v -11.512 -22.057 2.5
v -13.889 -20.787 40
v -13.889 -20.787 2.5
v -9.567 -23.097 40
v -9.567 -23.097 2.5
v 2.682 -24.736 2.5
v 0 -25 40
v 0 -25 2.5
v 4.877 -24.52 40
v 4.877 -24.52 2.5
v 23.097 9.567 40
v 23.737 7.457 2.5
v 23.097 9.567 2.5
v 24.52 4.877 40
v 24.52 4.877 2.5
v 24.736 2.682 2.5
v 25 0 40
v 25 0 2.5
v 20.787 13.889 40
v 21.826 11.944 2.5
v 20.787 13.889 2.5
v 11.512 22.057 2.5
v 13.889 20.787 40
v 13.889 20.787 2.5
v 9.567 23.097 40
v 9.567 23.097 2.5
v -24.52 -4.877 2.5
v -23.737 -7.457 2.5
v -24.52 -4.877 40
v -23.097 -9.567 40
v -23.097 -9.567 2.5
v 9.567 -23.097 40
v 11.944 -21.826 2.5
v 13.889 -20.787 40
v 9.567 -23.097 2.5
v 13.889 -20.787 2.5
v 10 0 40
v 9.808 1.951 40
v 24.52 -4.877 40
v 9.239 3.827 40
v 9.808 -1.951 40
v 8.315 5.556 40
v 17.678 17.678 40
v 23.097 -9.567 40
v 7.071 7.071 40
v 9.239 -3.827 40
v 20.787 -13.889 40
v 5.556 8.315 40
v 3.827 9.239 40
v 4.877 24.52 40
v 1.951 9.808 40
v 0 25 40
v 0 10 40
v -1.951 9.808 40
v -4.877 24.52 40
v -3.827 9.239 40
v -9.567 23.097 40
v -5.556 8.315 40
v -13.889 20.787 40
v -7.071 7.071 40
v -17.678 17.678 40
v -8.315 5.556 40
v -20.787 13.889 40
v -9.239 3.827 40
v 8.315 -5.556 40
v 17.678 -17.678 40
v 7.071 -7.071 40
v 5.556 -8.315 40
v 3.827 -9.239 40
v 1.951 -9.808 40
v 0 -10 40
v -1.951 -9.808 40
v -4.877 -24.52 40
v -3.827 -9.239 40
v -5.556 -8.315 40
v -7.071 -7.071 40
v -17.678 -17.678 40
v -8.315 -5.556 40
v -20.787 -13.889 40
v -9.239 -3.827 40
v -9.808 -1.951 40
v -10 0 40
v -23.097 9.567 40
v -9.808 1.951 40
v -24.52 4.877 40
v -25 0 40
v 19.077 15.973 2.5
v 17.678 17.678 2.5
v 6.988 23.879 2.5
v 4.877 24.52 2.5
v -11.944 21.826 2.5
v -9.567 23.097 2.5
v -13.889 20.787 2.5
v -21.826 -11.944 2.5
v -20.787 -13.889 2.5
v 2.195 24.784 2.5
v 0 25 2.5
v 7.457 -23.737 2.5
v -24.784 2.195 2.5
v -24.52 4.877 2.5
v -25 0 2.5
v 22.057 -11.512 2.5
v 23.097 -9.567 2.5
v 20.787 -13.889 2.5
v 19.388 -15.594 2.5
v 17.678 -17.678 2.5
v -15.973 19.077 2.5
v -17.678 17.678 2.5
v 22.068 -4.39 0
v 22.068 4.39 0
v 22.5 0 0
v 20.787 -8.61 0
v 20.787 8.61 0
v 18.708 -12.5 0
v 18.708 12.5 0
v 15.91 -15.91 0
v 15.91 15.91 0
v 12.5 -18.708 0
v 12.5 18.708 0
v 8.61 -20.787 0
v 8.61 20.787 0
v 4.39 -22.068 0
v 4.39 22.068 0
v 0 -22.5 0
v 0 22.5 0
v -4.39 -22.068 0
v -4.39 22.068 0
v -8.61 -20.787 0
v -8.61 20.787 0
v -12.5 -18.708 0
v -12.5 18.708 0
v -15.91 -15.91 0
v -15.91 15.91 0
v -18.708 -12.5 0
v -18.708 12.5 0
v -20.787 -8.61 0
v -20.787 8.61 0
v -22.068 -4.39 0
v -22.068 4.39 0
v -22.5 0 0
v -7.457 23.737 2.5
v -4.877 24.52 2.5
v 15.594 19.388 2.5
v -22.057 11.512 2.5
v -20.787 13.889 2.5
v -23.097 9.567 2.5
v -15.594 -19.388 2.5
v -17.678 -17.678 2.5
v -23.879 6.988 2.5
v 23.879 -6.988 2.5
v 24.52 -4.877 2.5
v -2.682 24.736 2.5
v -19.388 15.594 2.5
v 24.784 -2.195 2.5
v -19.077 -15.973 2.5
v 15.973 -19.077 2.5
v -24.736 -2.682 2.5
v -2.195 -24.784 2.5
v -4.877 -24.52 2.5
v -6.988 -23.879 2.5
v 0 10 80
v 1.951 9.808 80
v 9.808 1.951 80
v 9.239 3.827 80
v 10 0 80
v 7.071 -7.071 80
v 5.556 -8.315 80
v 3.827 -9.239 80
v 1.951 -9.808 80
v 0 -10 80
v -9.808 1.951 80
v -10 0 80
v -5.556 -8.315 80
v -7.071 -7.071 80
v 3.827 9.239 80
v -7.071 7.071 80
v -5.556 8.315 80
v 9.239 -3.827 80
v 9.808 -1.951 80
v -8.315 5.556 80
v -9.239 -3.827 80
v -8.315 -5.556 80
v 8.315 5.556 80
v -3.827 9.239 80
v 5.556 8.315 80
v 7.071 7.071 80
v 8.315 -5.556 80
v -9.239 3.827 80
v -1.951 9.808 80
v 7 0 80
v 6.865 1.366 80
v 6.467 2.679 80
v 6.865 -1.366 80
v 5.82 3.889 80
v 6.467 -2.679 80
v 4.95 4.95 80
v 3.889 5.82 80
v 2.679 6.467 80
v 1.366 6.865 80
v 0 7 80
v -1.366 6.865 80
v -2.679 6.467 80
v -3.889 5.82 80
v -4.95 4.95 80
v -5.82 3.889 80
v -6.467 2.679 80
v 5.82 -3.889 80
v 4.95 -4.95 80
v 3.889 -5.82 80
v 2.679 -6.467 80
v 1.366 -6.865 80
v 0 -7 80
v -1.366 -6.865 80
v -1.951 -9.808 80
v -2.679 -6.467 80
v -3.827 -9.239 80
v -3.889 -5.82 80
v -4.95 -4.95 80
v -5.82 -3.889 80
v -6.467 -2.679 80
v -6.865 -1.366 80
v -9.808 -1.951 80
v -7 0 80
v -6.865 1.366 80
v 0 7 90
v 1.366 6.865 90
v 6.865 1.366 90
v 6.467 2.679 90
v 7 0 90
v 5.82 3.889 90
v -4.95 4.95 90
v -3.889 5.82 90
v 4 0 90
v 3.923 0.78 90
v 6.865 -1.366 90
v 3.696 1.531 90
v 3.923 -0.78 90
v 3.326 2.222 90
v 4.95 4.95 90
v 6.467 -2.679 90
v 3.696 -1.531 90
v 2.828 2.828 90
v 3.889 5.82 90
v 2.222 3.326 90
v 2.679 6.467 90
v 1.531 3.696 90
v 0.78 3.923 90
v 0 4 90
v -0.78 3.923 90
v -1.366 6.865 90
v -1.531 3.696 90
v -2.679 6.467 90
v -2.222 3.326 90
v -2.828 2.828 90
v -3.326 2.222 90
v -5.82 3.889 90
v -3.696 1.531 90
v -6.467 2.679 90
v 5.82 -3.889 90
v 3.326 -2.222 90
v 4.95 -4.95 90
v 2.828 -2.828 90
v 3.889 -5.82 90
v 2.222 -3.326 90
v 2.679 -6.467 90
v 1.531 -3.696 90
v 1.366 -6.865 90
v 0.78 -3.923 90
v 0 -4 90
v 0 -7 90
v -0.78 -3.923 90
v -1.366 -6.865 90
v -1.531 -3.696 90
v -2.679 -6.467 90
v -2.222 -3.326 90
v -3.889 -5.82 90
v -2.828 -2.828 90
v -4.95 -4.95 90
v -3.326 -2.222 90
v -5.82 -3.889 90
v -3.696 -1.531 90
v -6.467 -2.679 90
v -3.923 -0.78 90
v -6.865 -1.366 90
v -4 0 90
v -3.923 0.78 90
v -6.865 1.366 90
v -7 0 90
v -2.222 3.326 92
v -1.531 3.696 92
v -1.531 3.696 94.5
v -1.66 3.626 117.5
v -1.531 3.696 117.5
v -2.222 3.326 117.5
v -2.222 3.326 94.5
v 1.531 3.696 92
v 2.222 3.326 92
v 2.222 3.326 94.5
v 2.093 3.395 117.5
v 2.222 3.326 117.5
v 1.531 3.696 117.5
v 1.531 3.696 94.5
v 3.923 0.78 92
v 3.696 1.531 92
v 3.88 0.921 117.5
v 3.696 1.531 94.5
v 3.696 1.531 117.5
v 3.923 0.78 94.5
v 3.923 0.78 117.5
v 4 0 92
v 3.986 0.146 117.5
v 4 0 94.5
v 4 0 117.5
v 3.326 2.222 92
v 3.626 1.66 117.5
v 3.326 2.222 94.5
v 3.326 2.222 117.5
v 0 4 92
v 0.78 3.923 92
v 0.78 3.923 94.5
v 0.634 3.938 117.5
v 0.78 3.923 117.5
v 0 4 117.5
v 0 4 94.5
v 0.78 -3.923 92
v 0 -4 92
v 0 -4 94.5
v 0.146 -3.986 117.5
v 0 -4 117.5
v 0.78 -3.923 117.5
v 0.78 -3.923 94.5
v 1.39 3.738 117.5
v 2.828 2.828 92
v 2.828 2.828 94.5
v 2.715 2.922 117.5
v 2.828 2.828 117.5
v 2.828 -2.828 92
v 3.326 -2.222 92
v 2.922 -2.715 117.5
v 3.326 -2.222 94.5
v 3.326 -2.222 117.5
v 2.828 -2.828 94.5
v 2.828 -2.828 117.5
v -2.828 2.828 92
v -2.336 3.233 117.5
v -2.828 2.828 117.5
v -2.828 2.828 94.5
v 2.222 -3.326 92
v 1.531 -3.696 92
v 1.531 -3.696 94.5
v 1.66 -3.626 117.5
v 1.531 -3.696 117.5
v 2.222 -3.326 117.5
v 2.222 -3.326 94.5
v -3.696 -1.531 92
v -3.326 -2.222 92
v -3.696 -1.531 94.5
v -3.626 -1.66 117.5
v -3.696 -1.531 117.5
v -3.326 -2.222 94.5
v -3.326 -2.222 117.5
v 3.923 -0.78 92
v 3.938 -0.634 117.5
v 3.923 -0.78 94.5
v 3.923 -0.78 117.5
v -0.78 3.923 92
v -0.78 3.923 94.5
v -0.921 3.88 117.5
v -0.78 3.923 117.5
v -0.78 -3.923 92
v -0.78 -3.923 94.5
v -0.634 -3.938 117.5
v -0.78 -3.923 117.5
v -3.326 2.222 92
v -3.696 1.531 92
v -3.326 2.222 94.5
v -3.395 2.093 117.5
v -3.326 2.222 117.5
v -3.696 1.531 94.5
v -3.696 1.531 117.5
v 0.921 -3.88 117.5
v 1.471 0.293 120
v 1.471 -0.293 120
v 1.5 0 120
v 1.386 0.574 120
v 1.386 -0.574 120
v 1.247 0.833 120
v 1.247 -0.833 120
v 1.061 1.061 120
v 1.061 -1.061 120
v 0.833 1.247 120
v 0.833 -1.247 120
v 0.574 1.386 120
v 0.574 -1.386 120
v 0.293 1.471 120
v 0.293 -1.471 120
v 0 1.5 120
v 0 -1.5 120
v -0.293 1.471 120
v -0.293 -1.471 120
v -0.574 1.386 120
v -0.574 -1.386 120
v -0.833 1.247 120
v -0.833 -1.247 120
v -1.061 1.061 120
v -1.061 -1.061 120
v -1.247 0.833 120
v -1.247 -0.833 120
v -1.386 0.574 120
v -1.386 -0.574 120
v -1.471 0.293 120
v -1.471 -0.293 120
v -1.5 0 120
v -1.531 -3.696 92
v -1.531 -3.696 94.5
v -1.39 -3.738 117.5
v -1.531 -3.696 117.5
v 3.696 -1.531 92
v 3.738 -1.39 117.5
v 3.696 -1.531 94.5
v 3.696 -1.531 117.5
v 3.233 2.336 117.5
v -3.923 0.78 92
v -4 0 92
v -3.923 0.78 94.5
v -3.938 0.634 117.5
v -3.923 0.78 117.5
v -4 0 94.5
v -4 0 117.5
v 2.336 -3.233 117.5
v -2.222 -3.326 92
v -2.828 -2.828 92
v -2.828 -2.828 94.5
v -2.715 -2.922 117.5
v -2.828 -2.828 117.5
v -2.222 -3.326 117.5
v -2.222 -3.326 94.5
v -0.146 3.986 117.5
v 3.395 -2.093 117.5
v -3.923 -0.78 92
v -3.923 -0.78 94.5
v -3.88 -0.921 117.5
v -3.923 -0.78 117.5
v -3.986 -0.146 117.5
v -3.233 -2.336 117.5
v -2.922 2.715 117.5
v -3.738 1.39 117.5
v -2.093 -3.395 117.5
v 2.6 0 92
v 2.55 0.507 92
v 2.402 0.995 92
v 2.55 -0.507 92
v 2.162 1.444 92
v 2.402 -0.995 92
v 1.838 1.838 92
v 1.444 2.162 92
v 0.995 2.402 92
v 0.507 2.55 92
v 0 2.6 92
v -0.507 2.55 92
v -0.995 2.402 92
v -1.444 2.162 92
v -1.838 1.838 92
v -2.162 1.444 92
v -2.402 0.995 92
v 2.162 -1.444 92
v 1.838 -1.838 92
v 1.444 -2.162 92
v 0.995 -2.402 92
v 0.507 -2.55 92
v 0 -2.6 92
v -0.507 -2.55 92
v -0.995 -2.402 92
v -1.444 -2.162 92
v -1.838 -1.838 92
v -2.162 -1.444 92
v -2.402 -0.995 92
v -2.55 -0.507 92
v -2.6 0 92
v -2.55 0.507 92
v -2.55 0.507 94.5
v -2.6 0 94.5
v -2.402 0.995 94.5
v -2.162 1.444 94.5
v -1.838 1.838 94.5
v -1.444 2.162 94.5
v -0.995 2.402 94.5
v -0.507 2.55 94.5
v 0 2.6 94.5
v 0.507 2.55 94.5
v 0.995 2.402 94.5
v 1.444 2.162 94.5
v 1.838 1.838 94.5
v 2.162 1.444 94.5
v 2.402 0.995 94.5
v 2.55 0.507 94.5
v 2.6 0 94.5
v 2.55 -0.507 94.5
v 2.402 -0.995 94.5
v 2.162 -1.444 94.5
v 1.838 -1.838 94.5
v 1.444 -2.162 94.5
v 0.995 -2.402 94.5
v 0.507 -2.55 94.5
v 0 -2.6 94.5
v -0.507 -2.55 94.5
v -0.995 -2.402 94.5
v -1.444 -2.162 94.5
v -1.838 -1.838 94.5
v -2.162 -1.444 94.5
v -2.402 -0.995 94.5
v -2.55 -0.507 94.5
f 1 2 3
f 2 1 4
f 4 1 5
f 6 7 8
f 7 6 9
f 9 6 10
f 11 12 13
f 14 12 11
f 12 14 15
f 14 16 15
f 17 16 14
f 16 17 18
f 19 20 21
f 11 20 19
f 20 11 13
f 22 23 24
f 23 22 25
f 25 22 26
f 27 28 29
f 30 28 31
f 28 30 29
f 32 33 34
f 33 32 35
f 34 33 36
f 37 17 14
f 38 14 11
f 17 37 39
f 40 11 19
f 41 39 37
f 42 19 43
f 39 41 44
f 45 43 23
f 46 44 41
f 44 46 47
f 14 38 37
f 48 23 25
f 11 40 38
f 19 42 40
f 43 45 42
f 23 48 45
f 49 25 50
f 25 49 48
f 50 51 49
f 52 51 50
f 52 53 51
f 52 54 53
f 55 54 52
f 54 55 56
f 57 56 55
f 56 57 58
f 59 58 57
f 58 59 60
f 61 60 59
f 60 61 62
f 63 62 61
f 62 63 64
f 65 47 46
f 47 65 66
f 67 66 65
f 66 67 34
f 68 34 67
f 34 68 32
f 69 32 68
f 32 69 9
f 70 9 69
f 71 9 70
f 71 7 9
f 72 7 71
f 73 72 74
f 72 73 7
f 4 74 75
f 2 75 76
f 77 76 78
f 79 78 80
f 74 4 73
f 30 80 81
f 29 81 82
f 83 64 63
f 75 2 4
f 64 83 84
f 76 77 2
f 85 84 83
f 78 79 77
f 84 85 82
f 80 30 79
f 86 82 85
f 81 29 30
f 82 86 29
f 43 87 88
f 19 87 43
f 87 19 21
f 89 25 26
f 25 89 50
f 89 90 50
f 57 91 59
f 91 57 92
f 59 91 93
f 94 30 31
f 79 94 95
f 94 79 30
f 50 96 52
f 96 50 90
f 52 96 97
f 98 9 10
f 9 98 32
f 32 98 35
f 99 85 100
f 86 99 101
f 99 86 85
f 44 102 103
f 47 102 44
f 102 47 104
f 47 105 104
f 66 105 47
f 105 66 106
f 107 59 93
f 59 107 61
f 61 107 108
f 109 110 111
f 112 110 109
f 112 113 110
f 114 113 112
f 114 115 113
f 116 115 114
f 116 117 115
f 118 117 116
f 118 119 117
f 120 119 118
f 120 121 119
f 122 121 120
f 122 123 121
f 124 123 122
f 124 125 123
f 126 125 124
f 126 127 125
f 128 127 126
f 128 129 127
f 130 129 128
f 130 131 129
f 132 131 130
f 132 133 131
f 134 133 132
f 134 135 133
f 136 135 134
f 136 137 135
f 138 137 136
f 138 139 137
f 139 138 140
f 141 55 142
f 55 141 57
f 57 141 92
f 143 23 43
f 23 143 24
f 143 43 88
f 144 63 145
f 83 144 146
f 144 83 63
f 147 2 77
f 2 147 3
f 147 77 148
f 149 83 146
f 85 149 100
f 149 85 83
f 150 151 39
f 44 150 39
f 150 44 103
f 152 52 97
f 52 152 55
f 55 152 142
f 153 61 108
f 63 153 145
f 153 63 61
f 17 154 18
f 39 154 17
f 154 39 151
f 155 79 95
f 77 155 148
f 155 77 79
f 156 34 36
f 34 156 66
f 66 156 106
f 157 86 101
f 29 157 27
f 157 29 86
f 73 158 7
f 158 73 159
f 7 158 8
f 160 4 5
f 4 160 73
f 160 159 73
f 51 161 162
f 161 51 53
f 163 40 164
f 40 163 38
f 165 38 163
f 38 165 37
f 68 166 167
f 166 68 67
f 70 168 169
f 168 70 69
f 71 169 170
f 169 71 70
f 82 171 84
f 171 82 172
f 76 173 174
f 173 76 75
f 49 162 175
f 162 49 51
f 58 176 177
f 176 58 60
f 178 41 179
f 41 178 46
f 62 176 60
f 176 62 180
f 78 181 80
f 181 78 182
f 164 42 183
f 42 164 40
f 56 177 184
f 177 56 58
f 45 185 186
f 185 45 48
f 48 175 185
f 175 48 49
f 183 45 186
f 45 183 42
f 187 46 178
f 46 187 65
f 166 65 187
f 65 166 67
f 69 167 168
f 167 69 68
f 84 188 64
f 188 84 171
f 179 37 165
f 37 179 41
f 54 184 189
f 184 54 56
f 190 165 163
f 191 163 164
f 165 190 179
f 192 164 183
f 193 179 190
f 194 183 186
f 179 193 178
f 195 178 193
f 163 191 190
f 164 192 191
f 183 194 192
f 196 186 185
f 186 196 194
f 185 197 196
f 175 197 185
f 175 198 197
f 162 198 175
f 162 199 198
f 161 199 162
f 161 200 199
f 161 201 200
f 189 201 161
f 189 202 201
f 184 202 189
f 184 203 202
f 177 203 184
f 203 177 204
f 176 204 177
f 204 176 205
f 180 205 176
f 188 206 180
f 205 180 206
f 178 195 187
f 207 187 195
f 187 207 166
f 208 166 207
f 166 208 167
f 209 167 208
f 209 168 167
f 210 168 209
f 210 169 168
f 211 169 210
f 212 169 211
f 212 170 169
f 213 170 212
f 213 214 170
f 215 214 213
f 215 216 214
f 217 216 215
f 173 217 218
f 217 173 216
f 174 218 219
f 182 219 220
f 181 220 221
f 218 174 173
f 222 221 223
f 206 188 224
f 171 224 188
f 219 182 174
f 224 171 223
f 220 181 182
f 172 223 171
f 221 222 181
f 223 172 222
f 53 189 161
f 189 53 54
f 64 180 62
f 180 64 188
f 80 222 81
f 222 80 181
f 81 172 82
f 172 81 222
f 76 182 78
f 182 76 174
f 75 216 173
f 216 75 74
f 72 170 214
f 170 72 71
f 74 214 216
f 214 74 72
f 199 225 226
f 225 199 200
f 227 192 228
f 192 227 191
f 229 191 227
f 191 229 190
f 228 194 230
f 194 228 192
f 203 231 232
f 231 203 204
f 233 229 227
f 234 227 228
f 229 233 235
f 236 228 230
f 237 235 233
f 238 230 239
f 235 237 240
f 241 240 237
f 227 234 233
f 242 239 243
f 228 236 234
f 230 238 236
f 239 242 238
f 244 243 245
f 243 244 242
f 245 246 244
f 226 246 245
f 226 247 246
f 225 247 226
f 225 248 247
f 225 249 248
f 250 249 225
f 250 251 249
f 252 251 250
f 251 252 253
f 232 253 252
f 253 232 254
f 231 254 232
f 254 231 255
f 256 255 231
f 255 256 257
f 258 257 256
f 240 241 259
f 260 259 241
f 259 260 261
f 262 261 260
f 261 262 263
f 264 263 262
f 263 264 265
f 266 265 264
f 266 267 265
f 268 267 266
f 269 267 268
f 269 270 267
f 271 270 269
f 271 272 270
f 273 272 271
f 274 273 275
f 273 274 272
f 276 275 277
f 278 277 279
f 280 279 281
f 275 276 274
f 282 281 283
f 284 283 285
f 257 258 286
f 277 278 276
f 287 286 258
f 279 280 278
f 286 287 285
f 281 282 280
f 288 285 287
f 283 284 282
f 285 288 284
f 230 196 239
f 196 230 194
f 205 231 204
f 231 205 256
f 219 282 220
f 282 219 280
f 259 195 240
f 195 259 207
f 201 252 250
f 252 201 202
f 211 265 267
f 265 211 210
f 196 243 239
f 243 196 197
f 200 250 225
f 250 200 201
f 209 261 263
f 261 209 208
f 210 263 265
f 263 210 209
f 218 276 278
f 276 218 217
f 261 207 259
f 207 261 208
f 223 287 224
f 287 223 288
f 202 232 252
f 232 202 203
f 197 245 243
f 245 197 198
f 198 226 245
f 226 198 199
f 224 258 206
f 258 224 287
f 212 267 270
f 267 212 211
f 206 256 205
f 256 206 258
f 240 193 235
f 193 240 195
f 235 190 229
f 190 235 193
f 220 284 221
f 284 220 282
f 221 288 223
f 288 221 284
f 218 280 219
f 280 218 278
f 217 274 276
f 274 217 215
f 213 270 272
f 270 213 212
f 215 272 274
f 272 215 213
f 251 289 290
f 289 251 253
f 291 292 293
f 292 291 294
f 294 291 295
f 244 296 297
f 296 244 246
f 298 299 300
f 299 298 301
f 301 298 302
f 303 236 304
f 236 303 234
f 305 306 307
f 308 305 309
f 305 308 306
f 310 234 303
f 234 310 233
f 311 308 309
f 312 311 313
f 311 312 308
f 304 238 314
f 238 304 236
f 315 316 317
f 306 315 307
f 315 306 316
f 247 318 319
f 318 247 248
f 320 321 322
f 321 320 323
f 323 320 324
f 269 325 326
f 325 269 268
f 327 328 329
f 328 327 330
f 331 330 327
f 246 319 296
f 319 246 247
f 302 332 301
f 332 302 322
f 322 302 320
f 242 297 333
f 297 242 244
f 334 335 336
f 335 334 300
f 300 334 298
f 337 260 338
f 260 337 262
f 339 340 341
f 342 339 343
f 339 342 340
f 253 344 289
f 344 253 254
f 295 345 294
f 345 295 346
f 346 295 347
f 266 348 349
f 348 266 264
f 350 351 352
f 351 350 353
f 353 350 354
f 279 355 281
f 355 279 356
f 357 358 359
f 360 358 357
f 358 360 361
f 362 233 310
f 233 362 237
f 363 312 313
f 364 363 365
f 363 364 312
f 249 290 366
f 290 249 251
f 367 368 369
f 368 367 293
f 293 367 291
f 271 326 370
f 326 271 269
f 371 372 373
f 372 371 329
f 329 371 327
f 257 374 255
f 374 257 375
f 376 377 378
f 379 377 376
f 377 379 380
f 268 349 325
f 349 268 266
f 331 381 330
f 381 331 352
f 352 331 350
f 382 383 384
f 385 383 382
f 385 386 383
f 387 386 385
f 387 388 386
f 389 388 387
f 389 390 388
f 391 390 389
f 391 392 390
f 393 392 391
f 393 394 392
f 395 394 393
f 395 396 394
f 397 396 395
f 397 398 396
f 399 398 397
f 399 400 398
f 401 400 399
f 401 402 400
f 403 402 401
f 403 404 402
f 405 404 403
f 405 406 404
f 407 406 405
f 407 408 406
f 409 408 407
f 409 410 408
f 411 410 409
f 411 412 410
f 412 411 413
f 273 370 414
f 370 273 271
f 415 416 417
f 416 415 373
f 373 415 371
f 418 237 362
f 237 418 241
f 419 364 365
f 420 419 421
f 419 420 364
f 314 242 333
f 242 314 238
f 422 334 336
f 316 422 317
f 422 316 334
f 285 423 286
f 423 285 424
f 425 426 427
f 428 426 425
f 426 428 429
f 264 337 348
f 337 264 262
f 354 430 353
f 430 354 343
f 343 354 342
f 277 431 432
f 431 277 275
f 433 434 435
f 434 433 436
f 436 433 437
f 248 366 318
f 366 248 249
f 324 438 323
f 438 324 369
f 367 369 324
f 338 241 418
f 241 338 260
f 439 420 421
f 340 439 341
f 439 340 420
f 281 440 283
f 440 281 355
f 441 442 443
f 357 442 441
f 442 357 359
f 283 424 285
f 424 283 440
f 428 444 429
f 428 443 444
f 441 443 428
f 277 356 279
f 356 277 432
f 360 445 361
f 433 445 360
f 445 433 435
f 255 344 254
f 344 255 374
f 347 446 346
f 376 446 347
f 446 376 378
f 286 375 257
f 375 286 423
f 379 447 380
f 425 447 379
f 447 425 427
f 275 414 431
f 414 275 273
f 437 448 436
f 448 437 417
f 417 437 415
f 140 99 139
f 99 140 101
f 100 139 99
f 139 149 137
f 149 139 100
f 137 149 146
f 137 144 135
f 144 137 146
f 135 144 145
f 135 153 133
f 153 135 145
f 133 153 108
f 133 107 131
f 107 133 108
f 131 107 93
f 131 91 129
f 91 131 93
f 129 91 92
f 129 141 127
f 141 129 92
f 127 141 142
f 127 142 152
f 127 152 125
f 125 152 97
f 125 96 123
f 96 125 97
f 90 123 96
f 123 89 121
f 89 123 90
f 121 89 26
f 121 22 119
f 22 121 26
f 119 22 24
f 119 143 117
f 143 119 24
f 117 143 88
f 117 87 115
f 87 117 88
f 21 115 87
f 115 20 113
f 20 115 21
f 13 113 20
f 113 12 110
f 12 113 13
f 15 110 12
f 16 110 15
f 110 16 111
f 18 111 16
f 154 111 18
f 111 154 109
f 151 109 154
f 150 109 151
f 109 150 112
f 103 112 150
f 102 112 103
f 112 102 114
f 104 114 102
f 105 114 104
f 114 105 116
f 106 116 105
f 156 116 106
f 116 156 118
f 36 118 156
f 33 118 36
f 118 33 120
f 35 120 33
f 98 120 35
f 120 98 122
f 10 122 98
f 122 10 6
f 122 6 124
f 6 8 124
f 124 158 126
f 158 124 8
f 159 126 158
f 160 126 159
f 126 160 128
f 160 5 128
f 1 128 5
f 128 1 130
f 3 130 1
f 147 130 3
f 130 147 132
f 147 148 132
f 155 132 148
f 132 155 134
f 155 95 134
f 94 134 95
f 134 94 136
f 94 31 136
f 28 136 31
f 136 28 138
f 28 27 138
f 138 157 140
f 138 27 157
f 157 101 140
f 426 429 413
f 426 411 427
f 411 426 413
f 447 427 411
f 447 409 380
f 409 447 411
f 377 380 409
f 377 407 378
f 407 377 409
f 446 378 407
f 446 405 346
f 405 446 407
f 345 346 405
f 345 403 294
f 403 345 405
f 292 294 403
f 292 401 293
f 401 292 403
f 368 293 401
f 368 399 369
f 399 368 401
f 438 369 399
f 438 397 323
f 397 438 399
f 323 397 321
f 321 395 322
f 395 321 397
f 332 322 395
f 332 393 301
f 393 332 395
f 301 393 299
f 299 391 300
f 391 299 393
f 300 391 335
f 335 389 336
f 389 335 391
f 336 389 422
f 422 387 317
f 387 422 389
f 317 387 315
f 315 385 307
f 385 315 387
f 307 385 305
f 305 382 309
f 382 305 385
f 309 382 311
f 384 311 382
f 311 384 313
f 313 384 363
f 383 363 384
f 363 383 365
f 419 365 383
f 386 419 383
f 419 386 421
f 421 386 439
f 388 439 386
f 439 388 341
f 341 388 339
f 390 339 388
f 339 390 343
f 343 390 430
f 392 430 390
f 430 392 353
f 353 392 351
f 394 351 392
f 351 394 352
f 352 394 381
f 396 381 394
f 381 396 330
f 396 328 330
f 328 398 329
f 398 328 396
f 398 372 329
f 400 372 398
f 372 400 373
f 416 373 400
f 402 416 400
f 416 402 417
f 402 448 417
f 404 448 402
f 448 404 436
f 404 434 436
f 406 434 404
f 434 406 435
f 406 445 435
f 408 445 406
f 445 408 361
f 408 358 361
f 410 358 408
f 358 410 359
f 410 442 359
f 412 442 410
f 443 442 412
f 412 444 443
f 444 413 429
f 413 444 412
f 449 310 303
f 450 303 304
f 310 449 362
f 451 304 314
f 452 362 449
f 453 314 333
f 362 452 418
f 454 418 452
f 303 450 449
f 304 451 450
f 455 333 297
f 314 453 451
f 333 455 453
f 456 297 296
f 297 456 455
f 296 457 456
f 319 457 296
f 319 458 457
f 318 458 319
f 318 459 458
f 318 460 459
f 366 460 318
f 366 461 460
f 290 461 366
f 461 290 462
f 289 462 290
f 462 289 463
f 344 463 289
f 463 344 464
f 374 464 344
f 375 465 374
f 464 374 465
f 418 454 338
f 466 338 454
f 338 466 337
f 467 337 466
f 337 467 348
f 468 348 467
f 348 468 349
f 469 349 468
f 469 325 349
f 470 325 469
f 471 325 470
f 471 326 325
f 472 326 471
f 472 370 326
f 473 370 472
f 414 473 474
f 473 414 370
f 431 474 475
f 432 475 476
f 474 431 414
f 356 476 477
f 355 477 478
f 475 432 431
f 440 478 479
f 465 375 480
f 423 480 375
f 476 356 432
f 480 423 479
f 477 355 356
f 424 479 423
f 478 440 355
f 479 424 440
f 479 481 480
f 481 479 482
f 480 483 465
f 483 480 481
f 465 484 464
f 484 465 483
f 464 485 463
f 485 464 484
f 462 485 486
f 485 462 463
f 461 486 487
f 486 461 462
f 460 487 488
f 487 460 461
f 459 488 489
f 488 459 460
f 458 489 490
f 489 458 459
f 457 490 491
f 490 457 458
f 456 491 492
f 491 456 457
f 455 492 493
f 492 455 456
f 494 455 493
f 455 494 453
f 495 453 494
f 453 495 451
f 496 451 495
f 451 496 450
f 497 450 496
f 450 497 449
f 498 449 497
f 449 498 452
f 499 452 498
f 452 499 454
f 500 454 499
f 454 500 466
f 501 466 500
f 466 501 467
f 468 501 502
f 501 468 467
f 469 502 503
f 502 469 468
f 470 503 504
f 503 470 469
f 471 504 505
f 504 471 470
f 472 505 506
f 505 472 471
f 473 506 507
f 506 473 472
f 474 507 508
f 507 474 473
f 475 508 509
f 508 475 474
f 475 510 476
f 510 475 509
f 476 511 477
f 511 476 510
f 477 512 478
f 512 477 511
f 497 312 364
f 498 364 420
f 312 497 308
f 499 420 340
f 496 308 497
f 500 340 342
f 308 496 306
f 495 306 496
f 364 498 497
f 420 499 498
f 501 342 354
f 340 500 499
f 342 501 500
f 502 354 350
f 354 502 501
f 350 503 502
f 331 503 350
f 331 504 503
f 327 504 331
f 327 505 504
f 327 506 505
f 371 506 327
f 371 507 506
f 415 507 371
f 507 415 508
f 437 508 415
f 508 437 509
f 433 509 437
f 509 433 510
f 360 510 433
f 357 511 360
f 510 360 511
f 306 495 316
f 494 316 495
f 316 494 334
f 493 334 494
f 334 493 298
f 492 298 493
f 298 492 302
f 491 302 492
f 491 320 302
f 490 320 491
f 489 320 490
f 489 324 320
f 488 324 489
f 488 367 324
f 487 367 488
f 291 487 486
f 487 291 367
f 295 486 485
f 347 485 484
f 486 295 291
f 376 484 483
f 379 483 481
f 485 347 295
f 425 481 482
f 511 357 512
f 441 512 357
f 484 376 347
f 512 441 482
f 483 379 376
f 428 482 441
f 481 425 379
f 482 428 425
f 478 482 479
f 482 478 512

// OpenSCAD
$fn = 32;

// ----------------------------------------------------------------------
// Stepped shaft: diameters 50, 20, 14, 8 mm, 120 mm long
// ----------------------------------------------------------------------

// --- parameters (mm) ---
d1 = 50;                  // step 1 diameter
len1 = 40;                // step 1 length
d2 = 20;                  // step 2 diameter
len2 = 40;                // step 2 length
d3 = 14;                  // step 3 diameter
len3 = 10;                // step 3 length
d4 = 8;                   // step 4 diameter
len4 = 30;                // step 4 length
total = 120;              // overall length
chamfer = 2.5;            // end chamfer
groove_r = 4;             // groove radius
groove_z = 92;            // groove position from the end
groove_w = 2.5;           // groove width
groove_d = 1.4;           // groove depth

difference() {
  /* turned body: stacked cylinders, every step sunk into the bigger one */
  union() {
    cylinder(h = len1, d = d1);
    translate([0, 0, 39.6]) cylinder(h = 40.4, d = d2);
    translate([0, 0, 79.6]) cylinder(h = 10.4, d = d3);
    translate([0, 0, 89.6]) cylinder(h = 30.4, d = d4);
  }
  /* bottom chamfer ring cut */
  rotate_extrude() translate([22.5, -2.5]) polygon([[0, 0], [5, 0], [5, 7.5], [0, 2.5]]);
  /* top chamfer ring cut */
  rotate_extrude() translate([1.5, 120]) polygon([[0, 0], [5, -5], [5, 2.5], [0, 2.5]]);
  /* circlip groove just behind the shoulder */
  rotate_extrude() translate([groove_r - groove_d, groove_z]) square([groove_d + 2.5, groove_w]);
}
